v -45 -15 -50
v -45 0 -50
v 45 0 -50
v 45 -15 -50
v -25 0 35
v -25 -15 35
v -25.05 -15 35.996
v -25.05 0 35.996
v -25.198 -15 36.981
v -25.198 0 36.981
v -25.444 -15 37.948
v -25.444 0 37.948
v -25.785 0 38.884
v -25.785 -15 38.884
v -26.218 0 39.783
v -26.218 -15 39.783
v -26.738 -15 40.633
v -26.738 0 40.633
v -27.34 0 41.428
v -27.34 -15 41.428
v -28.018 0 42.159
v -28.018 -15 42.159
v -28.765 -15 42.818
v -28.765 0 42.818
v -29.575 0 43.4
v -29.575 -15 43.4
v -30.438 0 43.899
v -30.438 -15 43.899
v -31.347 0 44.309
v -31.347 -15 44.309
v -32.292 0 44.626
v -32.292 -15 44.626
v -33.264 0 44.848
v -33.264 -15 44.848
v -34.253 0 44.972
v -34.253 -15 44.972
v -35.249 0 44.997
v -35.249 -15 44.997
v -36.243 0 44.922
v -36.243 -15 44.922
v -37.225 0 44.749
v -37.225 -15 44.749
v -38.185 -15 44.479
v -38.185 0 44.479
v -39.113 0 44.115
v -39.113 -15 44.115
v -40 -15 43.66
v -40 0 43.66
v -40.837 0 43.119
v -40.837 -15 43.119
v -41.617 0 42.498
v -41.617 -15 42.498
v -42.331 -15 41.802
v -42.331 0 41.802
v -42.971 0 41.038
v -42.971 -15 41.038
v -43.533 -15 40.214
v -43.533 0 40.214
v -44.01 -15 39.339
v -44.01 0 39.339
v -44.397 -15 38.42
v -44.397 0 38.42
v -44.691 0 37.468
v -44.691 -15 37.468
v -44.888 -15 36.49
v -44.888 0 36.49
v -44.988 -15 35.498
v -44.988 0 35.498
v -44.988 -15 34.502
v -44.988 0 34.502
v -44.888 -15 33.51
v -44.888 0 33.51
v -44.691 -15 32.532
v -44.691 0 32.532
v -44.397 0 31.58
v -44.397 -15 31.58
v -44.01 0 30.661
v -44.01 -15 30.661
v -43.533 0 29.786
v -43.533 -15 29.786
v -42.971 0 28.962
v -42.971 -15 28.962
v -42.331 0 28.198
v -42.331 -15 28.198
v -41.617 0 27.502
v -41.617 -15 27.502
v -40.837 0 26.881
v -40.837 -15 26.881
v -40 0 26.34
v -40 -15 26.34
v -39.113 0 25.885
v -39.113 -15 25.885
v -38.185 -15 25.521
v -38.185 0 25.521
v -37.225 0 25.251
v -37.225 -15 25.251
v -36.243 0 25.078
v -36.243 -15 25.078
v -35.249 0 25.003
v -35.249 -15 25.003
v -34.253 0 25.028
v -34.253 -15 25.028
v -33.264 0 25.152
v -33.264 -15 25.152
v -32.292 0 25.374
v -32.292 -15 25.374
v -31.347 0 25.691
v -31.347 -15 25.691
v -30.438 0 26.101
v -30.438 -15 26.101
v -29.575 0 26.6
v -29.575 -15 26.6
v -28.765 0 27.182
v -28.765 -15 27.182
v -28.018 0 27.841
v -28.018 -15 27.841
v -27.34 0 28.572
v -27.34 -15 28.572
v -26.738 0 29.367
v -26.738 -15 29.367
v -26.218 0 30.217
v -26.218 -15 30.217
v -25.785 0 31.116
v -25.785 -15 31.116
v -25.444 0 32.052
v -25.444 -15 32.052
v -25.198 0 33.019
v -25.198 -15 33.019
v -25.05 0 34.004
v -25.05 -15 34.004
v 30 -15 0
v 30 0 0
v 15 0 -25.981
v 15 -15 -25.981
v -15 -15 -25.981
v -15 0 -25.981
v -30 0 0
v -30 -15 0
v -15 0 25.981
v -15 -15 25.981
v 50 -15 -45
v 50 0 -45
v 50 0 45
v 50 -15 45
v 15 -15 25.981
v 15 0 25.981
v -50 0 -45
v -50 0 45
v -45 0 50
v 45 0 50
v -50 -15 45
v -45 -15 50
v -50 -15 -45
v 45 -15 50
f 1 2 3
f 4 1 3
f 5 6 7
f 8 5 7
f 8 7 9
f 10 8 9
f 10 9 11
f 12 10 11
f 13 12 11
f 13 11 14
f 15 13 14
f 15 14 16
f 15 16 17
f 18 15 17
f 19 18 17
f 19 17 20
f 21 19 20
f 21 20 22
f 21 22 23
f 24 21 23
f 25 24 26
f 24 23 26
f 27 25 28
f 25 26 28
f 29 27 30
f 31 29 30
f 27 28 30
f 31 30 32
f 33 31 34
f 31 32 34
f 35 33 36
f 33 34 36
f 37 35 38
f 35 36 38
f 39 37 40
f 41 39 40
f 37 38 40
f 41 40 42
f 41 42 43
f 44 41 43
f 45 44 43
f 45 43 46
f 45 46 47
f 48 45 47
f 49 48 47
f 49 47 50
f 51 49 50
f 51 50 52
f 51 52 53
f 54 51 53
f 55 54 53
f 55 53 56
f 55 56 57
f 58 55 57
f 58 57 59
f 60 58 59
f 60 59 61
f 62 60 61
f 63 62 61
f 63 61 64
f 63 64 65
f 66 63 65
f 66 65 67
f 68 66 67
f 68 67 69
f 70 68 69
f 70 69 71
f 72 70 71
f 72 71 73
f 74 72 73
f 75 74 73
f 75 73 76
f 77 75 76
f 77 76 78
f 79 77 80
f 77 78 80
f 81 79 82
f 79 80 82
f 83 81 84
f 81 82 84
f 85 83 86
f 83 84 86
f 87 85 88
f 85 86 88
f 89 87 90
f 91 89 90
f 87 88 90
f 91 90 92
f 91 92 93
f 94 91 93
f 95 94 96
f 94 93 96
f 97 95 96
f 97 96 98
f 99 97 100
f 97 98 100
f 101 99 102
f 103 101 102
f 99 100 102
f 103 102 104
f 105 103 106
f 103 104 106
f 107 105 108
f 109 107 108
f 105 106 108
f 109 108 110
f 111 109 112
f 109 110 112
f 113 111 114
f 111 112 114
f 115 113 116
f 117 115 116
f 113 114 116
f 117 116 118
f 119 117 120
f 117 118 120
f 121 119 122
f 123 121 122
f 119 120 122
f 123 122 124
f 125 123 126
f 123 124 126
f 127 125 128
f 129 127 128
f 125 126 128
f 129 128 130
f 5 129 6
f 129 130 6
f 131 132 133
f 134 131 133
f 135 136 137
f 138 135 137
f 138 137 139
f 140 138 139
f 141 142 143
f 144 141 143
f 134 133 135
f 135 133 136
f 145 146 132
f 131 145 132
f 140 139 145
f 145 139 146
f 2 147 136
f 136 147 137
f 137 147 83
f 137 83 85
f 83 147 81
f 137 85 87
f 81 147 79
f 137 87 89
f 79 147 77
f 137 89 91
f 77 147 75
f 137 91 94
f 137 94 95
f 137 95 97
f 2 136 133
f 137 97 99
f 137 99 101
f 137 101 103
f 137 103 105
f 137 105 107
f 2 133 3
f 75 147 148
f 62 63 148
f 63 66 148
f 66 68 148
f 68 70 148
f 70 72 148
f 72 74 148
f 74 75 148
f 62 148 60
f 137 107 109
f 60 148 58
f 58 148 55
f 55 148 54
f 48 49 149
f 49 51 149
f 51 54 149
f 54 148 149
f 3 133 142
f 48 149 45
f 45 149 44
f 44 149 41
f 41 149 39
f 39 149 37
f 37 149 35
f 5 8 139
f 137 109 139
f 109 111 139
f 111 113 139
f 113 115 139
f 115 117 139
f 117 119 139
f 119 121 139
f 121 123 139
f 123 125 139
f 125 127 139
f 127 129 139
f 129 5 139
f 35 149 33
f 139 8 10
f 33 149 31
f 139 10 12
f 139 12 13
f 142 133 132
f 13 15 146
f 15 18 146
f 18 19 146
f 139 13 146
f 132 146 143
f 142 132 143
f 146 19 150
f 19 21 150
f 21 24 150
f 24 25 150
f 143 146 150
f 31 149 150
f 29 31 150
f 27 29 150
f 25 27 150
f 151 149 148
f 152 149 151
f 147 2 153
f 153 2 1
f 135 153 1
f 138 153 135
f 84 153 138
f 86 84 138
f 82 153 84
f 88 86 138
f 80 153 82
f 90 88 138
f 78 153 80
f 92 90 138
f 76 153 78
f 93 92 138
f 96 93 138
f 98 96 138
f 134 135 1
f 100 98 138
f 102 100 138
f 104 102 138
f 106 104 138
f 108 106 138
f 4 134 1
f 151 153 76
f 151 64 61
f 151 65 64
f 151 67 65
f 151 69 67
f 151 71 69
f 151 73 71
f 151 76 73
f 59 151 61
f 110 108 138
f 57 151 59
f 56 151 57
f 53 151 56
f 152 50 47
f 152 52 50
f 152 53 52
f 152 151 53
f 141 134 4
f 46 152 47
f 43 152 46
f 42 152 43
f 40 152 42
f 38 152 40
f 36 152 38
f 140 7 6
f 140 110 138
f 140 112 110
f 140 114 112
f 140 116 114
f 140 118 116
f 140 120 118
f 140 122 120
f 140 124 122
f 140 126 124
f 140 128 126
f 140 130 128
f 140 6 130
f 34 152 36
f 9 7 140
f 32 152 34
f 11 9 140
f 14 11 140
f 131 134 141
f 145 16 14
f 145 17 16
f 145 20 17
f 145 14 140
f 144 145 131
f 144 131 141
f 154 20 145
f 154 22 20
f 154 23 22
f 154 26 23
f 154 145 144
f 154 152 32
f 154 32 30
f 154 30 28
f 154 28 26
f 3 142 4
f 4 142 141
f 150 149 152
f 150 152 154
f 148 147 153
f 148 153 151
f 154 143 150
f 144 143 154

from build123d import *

# Parameters (mm, degrees)
F0_W     = 100
F0_H     = 100
F1_DEPTH = 15
F2_R     = 10
F3_DEPTH = 15.001
F4_SIZE  = 5


with BuildPart() as f1:
    # F0 (on Front) → F1 (new body)
    with BuildSketch(Plane.XZ):
        Rectangle(F0_W, F0_H)
        Polygon((15, 25.980762), (30, 0), (15, -25.980762), (-15, -25.980762), (-30, 0), (-15, 25.980762), align=None, mode=Mode.SUBTRACT)
    extrude(amount=F1_DEPTH)

    # F2 (on face) → F3 (cut, through all)
    with BuildSketch(Plane.XZ.offset(15)):
        with Locations((-35, 35)):
            Circle(F2_R)
    extrude(amount=-F3_DEPTH, mode=Mode.SUBTRACT)

    # F4
    f4_edges = [f1.edges().sort_by_distance(p)[0] for p in [
        (50, -7.5, 50),
        (-50, -7.5, 50),
        (50, -7.5, -50),
        (-50, -7.5, -50),
    ]]
    chamfer(f4_edges, length=F4_SIZE)


solid = f1.part
